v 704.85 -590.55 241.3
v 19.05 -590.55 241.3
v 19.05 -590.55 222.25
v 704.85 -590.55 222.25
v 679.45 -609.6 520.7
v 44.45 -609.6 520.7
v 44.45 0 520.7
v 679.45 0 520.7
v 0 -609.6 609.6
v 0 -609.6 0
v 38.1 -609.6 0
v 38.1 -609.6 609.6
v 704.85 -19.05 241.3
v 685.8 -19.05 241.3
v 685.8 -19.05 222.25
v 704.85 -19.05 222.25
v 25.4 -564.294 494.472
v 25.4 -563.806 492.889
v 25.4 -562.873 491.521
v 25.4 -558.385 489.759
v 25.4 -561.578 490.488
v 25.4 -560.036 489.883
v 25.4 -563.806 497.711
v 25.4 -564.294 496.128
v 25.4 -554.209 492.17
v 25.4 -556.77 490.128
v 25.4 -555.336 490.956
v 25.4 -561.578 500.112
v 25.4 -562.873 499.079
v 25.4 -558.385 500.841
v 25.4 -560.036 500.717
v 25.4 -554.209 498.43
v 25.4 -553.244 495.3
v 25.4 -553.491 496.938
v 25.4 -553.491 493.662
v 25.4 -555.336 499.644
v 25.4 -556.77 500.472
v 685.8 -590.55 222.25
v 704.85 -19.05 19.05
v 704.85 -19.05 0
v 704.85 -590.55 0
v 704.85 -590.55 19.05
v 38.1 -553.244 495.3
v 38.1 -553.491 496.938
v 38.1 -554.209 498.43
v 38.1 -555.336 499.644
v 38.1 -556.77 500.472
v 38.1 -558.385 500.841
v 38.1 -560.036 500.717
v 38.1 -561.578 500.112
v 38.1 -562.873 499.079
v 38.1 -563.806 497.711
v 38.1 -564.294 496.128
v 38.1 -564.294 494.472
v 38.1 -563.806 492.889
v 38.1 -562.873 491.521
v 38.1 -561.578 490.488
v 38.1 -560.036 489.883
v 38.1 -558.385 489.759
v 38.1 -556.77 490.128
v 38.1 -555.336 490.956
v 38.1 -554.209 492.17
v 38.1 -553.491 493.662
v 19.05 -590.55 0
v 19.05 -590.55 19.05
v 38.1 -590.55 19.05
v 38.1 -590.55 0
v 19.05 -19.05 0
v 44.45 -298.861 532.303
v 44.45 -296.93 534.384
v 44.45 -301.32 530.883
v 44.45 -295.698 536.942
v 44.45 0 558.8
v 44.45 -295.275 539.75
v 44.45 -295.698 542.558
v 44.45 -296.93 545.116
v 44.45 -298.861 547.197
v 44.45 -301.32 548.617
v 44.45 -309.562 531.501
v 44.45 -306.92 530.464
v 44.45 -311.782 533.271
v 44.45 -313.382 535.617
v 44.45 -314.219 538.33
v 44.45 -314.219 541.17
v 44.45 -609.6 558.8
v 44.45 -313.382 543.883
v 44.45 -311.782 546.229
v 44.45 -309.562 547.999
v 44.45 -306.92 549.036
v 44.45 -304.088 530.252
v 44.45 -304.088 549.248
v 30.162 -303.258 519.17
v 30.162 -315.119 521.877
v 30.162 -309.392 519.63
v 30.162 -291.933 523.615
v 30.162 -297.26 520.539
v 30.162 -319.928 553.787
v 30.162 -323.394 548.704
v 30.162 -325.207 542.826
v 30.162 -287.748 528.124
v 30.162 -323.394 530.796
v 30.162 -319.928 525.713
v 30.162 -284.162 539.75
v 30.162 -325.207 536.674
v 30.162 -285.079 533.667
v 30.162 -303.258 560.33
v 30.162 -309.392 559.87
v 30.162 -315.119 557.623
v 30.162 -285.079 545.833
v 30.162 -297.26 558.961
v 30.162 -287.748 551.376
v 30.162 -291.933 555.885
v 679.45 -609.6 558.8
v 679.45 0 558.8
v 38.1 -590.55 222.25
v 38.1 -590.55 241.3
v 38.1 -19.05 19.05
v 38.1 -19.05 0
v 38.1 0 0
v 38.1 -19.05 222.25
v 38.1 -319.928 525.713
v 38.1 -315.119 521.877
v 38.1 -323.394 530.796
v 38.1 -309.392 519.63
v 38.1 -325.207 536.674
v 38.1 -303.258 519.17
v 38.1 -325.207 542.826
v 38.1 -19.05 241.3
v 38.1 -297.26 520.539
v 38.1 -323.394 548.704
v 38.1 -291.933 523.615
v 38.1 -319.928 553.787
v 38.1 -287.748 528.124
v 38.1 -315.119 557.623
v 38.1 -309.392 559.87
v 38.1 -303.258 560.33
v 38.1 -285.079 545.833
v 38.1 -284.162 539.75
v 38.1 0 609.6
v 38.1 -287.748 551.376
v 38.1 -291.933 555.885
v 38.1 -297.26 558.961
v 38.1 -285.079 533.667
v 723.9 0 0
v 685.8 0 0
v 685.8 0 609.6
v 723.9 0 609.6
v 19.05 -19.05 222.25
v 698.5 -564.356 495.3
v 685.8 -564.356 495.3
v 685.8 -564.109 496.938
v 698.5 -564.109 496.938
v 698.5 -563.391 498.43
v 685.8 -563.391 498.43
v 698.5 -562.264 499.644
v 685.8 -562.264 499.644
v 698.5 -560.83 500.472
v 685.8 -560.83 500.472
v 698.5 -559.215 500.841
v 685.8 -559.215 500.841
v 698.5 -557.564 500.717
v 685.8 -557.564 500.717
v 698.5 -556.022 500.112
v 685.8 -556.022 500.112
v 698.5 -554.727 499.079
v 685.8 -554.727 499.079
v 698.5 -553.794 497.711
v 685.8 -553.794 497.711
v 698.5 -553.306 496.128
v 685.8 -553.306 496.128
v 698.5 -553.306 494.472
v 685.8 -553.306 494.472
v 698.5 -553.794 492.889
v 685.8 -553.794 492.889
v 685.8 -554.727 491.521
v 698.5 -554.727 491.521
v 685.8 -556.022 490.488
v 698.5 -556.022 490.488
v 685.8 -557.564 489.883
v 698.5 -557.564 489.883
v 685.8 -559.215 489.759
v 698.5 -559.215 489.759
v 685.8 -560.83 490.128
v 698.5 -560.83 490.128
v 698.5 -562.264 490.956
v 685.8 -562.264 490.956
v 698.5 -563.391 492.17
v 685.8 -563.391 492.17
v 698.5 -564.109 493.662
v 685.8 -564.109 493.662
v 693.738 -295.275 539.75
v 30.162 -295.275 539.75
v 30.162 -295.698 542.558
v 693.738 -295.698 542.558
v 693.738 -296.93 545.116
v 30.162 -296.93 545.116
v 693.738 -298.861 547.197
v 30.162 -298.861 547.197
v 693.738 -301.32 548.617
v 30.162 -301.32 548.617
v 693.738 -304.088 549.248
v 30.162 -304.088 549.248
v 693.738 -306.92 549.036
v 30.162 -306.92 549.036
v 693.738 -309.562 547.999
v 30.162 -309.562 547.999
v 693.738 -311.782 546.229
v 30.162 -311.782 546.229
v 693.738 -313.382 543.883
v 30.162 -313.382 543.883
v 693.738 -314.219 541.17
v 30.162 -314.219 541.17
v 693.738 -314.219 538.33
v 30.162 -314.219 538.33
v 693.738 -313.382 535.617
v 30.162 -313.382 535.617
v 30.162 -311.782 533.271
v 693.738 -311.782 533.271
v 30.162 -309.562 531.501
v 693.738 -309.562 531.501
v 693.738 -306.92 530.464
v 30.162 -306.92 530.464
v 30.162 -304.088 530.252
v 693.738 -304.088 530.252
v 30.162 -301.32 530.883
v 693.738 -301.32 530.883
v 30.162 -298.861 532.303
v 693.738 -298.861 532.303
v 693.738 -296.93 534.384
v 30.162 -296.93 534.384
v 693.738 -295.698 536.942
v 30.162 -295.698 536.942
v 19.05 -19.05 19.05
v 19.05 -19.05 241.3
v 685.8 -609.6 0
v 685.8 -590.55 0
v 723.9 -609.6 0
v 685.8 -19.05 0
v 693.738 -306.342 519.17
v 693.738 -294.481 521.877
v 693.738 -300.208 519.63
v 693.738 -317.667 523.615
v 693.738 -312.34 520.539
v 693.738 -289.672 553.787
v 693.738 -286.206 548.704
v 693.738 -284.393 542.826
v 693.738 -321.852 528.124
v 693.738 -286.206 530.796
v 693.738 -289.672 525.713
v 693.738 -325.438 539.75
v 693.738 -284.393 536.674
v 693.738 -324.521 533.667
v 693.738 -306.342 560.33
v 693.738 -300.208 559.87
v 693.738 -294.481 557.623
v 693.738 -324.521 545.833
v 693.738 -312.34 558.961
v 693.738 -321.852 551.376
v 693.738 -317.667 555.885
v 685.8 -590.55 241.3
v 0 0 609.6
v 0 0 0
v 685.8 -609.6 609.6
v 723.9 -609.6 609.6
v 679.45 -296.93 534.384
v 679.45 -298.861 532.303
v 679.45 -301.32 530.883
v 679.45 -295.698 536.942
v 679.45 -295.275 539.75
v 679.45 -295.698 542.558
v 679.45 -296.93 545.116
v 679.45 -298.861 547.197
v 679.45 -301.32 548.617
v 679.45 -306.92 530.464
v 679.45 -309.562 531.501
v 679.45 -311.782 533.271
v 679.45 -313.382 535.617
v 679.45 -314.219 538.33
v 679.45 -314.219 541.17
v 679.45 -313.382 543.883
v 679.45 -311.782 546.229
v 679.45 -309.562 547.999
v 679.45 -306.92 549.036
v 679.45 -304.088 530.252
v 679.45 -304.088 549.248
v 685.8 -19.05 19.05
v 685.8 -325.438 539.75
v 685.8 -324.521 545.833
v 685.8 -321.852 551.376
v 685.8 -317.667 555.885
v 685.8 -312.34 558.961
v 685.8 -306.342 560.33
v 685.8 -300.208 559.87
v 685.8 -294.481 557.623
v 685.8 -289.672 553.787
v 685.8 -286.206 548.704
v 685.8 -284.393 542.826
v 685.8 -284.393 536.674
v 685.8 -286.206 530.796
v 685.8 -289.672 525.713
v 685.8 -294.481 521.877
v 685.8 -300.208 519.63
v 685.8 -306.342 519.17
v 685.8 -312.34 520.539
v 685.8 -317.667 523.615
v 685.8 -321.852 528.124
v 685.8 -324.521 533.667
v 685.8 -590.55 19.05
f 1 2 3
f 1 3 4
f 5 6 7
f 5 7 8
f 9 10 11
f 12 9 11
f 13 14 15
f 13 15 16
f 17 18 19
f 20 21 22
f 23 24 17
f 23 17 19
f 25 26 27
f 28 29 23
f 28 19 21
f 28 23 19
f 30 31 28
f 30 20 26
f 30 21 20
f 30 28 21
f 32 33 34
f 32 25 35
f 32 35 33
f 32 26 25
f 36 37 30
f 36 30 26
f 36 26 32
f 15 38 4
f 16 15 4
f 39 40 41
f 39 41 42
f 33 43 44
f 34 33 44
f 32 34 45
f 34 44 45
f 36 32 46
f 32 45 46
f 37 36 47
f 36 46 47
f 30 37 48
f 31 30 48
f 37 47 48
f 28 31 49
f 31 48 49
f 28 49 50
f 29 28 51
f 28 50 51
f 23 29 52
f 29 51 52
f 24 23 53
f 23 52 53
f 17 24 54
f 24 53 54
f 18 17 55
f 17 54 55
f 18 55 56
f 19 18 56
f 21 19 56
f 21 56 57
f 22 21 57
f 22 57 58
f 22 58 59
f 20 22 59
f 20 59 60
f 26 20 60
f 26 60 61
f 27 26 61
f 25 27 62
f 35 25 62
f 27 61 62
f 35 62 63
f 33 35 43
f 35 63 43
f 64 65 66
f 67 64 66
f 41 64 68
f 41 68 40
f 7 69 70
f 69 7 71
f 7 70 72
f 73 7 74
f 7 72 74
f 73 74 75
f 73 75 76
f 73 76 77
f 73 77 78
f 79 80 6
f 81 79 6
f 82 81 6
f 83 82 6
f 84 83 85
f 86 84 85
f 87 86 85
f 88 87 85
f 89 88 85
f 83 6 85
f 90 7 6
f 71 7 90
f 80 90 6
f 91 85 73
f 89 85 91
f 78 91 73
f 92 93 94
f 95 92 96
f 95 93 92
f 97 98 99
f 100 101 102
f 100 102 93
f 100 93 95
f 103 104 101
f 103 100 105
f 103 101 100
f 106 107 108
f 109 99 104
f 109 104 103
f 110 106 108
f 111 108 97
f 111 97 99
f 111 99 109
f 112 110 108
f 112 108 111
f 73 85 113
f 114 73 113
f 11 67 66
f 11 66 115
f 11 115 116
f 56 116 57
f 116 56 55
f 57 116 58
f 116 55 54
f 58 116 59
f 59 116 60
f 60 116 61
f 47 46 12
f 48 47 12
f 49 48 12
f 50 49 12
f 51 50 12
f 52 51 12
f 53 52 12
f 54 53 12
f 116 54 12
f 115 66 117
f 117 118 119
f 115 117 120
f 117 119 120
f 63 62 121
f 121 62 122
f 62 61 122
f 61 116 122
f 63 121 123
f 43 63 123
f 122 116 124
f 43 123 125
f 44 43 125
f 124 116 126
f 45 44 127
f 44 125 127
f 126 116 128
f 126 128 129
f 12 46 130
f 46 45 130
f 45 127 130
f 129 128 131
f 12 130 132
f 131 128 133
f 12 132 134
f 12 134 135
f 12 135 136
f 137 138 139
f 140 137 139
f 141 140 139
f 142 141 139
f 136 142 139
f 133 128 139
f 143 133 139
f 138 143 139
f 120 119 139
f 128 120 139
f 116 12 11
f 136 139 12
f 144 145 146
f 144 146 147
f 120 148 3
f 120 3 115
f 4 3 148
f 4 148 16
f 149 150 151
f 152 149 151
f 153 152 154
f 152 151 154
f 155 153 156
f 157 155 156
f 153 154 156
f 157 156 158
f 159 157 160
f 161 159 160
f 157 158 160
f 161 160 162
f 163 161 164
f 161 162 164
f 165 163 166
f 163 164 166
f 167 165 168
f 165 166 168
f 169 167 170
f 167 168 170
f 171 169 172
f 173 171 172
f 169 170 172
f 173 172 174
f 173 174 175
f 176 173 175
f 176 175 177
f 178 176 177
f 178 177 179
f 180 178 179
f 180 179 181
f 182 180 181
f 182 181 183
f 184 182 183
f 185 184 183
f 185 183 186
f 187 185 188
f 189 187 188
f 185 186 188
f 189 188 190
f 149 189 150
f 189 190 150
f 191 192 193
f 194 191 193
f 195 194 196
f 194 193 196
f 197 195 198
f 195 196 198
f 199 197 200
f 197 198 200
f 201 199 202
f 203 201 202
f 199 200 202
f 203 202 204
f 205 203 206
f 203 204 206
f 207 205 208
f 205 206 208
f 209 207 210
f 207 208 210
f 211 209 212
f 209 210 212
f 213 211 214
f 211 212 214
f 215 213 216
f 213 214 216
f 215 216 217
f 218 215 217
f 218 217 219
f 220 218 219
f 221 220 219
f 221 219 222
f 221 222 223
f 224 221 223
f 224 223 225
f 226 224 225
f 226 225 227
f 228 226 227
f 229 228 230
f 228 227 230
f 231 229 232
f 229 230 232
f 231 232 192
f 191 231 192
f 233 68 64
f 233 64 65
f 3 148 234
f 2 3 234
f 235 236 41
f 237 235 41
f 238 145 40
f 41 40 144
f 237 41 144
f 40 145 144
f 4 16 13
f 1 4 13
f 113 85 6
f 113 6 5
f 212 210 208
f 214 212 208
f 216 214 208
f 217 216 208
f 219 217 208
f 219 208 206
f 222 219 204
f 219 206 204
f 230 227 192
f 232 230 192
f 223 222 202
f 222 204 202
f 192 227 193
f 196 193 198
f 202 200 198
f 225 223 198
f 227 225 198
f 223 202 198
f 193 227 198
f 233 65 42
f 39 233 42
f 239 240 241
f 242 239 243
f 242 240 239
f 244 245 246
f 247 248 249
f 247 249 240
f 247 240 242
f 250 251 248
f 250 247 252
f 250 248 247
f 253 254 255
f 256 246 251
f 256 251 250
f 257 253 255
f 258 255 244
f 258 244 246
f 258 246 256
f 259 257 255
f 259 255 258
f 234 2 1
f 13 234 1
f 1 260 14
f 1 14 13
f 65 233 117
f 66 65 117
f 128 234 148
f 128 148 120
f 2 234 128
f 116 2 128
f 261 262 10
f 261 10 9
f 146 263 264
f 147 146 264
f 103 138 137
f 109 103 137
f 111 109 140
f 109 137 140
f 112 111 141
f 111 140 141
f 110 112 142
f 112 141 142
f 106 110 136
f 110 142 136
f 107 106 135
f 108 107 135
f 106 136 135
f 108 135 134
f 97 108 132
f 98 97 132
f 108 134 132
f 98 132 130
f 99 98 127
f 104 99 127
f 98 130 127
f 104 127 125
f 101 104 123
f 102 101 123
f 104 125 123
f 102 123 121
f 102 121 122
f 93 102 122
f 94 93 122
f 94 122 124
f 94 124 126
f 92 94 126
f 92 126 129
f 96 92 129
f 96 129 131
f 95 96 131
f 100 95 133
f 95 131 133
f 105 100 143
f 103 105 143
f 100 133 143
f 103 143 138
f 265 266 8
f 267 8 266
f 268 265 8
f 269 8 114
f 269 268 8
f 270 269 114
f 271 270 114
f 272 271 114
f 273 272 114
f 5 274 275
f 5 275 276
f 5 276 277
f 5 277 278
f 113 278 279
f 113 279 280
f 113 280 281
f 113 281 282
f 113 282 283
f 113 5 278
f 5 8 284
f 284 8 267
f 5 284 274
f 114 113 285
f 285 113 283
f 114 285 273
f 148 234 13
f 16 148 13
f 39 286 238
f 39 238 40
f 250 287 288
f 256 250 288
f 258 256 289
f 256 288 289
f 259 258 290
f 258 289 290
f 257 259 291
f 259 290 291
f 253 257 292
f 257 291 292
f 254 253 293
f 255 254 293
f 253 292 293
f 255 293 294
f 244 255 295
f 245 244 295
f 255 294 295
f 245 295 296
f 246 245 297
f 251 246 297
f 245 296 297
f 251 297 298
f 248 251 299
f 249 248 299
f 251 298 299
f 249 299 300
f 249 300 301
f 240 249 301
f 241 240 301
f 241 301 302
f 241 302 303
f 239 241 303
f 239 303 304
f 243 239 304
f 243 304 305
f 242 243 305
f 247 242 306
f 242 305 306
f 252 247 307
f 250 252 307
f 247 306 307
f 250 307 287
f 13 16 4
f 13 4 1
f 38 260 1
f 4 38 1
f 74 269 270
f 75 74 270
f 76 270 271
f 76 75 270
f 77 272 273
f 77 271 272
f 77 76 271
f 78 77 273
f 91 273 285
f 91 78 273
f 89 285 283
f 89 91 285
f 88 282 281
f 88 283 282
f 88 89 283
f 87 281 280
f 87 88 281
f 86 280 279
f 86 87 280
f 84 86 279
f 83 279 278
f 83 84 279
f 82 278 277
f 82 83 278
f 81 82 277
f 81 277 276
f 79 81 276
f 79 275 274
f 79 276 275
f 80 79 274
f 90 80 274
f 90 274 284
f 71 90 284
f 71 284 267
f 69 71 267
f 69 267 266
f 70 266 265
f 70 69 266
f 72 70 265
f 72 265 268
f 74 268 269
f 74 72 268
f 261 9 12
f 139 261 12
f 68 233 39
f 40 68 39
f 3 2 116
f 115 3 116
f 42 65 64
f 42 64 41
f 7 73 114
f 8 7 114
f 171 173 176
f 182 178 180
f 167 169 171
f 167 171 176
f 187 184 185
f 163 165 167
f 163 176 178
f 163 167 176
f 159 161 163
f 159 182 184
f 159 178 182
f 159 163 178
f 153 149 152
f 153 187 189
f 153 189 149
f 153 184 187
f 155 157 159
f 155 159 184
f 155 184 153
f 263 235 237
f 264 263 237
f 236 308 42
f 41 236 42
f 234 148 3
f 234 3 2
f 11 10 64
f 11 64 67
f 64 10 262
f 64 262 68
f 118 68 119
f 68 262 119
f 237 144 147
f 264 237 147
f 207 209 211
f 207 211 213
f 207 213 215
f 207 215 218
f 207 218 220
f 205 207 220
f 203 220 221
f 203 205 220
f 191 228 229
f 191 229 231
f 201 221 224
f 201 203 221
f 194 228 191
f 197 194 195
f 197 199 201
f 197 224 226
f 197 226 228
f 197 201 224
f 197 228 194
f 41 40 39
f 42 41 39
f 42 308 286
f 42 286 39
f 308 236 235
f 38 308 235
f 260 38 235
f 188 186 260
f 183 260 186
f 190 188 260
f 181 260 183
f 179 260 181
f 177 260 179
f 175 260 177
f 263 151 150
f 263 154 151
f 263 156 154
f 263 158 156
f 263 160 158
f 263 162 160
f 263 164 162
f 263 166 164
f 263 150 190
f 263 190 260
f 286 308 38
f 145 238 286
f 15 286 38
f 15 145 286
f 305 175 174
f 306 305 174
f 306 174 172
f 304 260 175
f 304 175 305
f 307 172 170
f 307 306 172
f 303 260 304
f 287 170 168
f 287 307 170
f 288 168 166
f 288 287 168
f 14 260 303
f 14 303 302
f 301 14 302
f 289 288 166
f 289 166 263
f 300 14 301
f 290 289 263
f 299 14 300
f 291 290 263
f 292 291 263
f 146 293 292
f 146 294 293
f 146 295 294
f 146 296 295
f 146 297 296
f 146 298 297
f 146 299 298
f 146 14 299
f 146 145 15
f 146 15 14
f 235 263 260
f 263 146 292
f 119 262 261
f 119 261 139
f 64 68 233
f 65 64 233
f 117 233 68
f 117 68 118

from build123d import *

# Parameters (mm, degrees)
F0_W      = 38.1
F0_H      = 609.6
F1_DEPTH  = 609.6
F4_W      = 685.8
F4_H      = 19.05
F5_DEPTH  = 571.5
F7_W      = 685.8
F7_H      = 19.05
F8_DEPTH  = 571.5
F10_R     = 20.6375
F11_DEPTH = 7.9375
F12_R     = 20.6375
F13_DEPTH = 7.9375
F14_R     = 9.525
F15_DEPTH = 663.575
F16_W     = 635
F16_H     = 38.1
F17_DEPTH = 609.6
F19_R     = 5.55625
F20_DEPTH = 12.7
F21_R     = 5.55625
F22_DEPTH = 12.7


with BuildPart() as f1:
    # F0 (on Front) → F1 (new body)
    with BuildSketch(Plane.XZ):
        with Locations((19.05, 304.8)):
            Rectangle(F0_W, F0_H)
    extrude(amount=F1_DEPTH)


with BuildPart() as f2_1:
    # F2: copy of F1
    add(f1.part.moved(Location((685.8, 0, 0))))


with BuildPart() as f5:
    # F4 (on offset) → F5 (new body)
    with BuildSketch(Plane.XZ.offset(590.55)):
        with Locations((361.95, 9.525)):
            Rectangle(F4_W, F4_H)
    extrude(amount=-F5_DEPTH)


with BuildPart() as f1_1:
    add(f1.part)

    # F6: cut F5
    add(f5.part, mode=Mode.SUBTRACT)


with BuildPart() as f2_1_1:
    add(f2_1.part)

    # F6: cut F5
    add(f5.part, mode=Mode.SUBTRACT)


with BuildPart() as f8:
    # F7 (on offset) → F8 (new body)
    with BuildSketch(Plane.XZ.offset(590.55)):
        with Locations((361.95, 231.775)):
            Rectangle(F7_W, F7_H)
    extrude(amount=-F8_DEPTH)


with BuildPart() as f1_2:
    add(f1_1.part)

    # F9: cut F8
    add(f8.part, mode=Mode.SUBTRACT)

    # F10 (on face) → F11 (cut)
    with BuildSketch(Plane.YZ.offset(38.1)):
        with Locations((-304.8, 539.75)):
            Circle(F10_R)
    extrude(amount=-F11_DEPTH, mode=Mode.SUBTRACT)

    # F19 (on face) → F20 (cut)
    with BuildSketch(Plane.YZ.offset(38.1)):
        with Locations((-558.8, 495.3)):
            Circle(F19_R)
    extrude(amount=-F20_DEPTH, mode=Mode.SUBTRACT)


with BuildPart() as f2_1_2:
    add(f2_1_1.part)

    # F9: cut F8
    add(f8.part, mode=Mode.SUBTRACT)

    # F12 (on face) → F13 (cut)
    with BuildSketch(Plane(origin=(685.8, 0, 0), x_dir=(0, -1, 0), z_dir=(-1, 0, 0))):
        with Locations((304.8, 539.75)):
            Circle(F12_R)
    extrude(amount=-F13_DEPTH, mode=Mode.SUBTRACT)

    # F21 (on face) → F22 (cut)
    with BuildSketch(Plane(origin=(685.8, 0, 0), x_dir=(0, -1, 0), z_dir=(-1, 0, 0))):
        with Locations((558.8, 495.3)):
            Circle(F21_R)
    extrude(amount=-F22_DEPTH, mode=Mode.SUBTRACT)


with BuildPart() as f15:
    # F14 (on face) → F15 (new body, through all)
    with BuildSketch(Plane.YZ.offset(30.1625)):
        with Locations((-304.8, 539.75)):
            Circle(F14_R)
    extrude(amount=F15_DEPTH)


with BuildPart() as f17:
    # F16 (on face) → F17 (new body)
    with BuildSketch(Plane.XZ.offset(609.6)):
        with Locations((361.95, 539.75)):
            Rectangle(F16_W, F16_H)
    extrude(amount=-F17_DEPTH)

    # F18: cut F15
    add(f15.part, mode=Mode.SUBTRACT)


solid = Compound([f5.part, f8.part, f1_2.part, f2_1_2.part, f15.part, f17.part])
